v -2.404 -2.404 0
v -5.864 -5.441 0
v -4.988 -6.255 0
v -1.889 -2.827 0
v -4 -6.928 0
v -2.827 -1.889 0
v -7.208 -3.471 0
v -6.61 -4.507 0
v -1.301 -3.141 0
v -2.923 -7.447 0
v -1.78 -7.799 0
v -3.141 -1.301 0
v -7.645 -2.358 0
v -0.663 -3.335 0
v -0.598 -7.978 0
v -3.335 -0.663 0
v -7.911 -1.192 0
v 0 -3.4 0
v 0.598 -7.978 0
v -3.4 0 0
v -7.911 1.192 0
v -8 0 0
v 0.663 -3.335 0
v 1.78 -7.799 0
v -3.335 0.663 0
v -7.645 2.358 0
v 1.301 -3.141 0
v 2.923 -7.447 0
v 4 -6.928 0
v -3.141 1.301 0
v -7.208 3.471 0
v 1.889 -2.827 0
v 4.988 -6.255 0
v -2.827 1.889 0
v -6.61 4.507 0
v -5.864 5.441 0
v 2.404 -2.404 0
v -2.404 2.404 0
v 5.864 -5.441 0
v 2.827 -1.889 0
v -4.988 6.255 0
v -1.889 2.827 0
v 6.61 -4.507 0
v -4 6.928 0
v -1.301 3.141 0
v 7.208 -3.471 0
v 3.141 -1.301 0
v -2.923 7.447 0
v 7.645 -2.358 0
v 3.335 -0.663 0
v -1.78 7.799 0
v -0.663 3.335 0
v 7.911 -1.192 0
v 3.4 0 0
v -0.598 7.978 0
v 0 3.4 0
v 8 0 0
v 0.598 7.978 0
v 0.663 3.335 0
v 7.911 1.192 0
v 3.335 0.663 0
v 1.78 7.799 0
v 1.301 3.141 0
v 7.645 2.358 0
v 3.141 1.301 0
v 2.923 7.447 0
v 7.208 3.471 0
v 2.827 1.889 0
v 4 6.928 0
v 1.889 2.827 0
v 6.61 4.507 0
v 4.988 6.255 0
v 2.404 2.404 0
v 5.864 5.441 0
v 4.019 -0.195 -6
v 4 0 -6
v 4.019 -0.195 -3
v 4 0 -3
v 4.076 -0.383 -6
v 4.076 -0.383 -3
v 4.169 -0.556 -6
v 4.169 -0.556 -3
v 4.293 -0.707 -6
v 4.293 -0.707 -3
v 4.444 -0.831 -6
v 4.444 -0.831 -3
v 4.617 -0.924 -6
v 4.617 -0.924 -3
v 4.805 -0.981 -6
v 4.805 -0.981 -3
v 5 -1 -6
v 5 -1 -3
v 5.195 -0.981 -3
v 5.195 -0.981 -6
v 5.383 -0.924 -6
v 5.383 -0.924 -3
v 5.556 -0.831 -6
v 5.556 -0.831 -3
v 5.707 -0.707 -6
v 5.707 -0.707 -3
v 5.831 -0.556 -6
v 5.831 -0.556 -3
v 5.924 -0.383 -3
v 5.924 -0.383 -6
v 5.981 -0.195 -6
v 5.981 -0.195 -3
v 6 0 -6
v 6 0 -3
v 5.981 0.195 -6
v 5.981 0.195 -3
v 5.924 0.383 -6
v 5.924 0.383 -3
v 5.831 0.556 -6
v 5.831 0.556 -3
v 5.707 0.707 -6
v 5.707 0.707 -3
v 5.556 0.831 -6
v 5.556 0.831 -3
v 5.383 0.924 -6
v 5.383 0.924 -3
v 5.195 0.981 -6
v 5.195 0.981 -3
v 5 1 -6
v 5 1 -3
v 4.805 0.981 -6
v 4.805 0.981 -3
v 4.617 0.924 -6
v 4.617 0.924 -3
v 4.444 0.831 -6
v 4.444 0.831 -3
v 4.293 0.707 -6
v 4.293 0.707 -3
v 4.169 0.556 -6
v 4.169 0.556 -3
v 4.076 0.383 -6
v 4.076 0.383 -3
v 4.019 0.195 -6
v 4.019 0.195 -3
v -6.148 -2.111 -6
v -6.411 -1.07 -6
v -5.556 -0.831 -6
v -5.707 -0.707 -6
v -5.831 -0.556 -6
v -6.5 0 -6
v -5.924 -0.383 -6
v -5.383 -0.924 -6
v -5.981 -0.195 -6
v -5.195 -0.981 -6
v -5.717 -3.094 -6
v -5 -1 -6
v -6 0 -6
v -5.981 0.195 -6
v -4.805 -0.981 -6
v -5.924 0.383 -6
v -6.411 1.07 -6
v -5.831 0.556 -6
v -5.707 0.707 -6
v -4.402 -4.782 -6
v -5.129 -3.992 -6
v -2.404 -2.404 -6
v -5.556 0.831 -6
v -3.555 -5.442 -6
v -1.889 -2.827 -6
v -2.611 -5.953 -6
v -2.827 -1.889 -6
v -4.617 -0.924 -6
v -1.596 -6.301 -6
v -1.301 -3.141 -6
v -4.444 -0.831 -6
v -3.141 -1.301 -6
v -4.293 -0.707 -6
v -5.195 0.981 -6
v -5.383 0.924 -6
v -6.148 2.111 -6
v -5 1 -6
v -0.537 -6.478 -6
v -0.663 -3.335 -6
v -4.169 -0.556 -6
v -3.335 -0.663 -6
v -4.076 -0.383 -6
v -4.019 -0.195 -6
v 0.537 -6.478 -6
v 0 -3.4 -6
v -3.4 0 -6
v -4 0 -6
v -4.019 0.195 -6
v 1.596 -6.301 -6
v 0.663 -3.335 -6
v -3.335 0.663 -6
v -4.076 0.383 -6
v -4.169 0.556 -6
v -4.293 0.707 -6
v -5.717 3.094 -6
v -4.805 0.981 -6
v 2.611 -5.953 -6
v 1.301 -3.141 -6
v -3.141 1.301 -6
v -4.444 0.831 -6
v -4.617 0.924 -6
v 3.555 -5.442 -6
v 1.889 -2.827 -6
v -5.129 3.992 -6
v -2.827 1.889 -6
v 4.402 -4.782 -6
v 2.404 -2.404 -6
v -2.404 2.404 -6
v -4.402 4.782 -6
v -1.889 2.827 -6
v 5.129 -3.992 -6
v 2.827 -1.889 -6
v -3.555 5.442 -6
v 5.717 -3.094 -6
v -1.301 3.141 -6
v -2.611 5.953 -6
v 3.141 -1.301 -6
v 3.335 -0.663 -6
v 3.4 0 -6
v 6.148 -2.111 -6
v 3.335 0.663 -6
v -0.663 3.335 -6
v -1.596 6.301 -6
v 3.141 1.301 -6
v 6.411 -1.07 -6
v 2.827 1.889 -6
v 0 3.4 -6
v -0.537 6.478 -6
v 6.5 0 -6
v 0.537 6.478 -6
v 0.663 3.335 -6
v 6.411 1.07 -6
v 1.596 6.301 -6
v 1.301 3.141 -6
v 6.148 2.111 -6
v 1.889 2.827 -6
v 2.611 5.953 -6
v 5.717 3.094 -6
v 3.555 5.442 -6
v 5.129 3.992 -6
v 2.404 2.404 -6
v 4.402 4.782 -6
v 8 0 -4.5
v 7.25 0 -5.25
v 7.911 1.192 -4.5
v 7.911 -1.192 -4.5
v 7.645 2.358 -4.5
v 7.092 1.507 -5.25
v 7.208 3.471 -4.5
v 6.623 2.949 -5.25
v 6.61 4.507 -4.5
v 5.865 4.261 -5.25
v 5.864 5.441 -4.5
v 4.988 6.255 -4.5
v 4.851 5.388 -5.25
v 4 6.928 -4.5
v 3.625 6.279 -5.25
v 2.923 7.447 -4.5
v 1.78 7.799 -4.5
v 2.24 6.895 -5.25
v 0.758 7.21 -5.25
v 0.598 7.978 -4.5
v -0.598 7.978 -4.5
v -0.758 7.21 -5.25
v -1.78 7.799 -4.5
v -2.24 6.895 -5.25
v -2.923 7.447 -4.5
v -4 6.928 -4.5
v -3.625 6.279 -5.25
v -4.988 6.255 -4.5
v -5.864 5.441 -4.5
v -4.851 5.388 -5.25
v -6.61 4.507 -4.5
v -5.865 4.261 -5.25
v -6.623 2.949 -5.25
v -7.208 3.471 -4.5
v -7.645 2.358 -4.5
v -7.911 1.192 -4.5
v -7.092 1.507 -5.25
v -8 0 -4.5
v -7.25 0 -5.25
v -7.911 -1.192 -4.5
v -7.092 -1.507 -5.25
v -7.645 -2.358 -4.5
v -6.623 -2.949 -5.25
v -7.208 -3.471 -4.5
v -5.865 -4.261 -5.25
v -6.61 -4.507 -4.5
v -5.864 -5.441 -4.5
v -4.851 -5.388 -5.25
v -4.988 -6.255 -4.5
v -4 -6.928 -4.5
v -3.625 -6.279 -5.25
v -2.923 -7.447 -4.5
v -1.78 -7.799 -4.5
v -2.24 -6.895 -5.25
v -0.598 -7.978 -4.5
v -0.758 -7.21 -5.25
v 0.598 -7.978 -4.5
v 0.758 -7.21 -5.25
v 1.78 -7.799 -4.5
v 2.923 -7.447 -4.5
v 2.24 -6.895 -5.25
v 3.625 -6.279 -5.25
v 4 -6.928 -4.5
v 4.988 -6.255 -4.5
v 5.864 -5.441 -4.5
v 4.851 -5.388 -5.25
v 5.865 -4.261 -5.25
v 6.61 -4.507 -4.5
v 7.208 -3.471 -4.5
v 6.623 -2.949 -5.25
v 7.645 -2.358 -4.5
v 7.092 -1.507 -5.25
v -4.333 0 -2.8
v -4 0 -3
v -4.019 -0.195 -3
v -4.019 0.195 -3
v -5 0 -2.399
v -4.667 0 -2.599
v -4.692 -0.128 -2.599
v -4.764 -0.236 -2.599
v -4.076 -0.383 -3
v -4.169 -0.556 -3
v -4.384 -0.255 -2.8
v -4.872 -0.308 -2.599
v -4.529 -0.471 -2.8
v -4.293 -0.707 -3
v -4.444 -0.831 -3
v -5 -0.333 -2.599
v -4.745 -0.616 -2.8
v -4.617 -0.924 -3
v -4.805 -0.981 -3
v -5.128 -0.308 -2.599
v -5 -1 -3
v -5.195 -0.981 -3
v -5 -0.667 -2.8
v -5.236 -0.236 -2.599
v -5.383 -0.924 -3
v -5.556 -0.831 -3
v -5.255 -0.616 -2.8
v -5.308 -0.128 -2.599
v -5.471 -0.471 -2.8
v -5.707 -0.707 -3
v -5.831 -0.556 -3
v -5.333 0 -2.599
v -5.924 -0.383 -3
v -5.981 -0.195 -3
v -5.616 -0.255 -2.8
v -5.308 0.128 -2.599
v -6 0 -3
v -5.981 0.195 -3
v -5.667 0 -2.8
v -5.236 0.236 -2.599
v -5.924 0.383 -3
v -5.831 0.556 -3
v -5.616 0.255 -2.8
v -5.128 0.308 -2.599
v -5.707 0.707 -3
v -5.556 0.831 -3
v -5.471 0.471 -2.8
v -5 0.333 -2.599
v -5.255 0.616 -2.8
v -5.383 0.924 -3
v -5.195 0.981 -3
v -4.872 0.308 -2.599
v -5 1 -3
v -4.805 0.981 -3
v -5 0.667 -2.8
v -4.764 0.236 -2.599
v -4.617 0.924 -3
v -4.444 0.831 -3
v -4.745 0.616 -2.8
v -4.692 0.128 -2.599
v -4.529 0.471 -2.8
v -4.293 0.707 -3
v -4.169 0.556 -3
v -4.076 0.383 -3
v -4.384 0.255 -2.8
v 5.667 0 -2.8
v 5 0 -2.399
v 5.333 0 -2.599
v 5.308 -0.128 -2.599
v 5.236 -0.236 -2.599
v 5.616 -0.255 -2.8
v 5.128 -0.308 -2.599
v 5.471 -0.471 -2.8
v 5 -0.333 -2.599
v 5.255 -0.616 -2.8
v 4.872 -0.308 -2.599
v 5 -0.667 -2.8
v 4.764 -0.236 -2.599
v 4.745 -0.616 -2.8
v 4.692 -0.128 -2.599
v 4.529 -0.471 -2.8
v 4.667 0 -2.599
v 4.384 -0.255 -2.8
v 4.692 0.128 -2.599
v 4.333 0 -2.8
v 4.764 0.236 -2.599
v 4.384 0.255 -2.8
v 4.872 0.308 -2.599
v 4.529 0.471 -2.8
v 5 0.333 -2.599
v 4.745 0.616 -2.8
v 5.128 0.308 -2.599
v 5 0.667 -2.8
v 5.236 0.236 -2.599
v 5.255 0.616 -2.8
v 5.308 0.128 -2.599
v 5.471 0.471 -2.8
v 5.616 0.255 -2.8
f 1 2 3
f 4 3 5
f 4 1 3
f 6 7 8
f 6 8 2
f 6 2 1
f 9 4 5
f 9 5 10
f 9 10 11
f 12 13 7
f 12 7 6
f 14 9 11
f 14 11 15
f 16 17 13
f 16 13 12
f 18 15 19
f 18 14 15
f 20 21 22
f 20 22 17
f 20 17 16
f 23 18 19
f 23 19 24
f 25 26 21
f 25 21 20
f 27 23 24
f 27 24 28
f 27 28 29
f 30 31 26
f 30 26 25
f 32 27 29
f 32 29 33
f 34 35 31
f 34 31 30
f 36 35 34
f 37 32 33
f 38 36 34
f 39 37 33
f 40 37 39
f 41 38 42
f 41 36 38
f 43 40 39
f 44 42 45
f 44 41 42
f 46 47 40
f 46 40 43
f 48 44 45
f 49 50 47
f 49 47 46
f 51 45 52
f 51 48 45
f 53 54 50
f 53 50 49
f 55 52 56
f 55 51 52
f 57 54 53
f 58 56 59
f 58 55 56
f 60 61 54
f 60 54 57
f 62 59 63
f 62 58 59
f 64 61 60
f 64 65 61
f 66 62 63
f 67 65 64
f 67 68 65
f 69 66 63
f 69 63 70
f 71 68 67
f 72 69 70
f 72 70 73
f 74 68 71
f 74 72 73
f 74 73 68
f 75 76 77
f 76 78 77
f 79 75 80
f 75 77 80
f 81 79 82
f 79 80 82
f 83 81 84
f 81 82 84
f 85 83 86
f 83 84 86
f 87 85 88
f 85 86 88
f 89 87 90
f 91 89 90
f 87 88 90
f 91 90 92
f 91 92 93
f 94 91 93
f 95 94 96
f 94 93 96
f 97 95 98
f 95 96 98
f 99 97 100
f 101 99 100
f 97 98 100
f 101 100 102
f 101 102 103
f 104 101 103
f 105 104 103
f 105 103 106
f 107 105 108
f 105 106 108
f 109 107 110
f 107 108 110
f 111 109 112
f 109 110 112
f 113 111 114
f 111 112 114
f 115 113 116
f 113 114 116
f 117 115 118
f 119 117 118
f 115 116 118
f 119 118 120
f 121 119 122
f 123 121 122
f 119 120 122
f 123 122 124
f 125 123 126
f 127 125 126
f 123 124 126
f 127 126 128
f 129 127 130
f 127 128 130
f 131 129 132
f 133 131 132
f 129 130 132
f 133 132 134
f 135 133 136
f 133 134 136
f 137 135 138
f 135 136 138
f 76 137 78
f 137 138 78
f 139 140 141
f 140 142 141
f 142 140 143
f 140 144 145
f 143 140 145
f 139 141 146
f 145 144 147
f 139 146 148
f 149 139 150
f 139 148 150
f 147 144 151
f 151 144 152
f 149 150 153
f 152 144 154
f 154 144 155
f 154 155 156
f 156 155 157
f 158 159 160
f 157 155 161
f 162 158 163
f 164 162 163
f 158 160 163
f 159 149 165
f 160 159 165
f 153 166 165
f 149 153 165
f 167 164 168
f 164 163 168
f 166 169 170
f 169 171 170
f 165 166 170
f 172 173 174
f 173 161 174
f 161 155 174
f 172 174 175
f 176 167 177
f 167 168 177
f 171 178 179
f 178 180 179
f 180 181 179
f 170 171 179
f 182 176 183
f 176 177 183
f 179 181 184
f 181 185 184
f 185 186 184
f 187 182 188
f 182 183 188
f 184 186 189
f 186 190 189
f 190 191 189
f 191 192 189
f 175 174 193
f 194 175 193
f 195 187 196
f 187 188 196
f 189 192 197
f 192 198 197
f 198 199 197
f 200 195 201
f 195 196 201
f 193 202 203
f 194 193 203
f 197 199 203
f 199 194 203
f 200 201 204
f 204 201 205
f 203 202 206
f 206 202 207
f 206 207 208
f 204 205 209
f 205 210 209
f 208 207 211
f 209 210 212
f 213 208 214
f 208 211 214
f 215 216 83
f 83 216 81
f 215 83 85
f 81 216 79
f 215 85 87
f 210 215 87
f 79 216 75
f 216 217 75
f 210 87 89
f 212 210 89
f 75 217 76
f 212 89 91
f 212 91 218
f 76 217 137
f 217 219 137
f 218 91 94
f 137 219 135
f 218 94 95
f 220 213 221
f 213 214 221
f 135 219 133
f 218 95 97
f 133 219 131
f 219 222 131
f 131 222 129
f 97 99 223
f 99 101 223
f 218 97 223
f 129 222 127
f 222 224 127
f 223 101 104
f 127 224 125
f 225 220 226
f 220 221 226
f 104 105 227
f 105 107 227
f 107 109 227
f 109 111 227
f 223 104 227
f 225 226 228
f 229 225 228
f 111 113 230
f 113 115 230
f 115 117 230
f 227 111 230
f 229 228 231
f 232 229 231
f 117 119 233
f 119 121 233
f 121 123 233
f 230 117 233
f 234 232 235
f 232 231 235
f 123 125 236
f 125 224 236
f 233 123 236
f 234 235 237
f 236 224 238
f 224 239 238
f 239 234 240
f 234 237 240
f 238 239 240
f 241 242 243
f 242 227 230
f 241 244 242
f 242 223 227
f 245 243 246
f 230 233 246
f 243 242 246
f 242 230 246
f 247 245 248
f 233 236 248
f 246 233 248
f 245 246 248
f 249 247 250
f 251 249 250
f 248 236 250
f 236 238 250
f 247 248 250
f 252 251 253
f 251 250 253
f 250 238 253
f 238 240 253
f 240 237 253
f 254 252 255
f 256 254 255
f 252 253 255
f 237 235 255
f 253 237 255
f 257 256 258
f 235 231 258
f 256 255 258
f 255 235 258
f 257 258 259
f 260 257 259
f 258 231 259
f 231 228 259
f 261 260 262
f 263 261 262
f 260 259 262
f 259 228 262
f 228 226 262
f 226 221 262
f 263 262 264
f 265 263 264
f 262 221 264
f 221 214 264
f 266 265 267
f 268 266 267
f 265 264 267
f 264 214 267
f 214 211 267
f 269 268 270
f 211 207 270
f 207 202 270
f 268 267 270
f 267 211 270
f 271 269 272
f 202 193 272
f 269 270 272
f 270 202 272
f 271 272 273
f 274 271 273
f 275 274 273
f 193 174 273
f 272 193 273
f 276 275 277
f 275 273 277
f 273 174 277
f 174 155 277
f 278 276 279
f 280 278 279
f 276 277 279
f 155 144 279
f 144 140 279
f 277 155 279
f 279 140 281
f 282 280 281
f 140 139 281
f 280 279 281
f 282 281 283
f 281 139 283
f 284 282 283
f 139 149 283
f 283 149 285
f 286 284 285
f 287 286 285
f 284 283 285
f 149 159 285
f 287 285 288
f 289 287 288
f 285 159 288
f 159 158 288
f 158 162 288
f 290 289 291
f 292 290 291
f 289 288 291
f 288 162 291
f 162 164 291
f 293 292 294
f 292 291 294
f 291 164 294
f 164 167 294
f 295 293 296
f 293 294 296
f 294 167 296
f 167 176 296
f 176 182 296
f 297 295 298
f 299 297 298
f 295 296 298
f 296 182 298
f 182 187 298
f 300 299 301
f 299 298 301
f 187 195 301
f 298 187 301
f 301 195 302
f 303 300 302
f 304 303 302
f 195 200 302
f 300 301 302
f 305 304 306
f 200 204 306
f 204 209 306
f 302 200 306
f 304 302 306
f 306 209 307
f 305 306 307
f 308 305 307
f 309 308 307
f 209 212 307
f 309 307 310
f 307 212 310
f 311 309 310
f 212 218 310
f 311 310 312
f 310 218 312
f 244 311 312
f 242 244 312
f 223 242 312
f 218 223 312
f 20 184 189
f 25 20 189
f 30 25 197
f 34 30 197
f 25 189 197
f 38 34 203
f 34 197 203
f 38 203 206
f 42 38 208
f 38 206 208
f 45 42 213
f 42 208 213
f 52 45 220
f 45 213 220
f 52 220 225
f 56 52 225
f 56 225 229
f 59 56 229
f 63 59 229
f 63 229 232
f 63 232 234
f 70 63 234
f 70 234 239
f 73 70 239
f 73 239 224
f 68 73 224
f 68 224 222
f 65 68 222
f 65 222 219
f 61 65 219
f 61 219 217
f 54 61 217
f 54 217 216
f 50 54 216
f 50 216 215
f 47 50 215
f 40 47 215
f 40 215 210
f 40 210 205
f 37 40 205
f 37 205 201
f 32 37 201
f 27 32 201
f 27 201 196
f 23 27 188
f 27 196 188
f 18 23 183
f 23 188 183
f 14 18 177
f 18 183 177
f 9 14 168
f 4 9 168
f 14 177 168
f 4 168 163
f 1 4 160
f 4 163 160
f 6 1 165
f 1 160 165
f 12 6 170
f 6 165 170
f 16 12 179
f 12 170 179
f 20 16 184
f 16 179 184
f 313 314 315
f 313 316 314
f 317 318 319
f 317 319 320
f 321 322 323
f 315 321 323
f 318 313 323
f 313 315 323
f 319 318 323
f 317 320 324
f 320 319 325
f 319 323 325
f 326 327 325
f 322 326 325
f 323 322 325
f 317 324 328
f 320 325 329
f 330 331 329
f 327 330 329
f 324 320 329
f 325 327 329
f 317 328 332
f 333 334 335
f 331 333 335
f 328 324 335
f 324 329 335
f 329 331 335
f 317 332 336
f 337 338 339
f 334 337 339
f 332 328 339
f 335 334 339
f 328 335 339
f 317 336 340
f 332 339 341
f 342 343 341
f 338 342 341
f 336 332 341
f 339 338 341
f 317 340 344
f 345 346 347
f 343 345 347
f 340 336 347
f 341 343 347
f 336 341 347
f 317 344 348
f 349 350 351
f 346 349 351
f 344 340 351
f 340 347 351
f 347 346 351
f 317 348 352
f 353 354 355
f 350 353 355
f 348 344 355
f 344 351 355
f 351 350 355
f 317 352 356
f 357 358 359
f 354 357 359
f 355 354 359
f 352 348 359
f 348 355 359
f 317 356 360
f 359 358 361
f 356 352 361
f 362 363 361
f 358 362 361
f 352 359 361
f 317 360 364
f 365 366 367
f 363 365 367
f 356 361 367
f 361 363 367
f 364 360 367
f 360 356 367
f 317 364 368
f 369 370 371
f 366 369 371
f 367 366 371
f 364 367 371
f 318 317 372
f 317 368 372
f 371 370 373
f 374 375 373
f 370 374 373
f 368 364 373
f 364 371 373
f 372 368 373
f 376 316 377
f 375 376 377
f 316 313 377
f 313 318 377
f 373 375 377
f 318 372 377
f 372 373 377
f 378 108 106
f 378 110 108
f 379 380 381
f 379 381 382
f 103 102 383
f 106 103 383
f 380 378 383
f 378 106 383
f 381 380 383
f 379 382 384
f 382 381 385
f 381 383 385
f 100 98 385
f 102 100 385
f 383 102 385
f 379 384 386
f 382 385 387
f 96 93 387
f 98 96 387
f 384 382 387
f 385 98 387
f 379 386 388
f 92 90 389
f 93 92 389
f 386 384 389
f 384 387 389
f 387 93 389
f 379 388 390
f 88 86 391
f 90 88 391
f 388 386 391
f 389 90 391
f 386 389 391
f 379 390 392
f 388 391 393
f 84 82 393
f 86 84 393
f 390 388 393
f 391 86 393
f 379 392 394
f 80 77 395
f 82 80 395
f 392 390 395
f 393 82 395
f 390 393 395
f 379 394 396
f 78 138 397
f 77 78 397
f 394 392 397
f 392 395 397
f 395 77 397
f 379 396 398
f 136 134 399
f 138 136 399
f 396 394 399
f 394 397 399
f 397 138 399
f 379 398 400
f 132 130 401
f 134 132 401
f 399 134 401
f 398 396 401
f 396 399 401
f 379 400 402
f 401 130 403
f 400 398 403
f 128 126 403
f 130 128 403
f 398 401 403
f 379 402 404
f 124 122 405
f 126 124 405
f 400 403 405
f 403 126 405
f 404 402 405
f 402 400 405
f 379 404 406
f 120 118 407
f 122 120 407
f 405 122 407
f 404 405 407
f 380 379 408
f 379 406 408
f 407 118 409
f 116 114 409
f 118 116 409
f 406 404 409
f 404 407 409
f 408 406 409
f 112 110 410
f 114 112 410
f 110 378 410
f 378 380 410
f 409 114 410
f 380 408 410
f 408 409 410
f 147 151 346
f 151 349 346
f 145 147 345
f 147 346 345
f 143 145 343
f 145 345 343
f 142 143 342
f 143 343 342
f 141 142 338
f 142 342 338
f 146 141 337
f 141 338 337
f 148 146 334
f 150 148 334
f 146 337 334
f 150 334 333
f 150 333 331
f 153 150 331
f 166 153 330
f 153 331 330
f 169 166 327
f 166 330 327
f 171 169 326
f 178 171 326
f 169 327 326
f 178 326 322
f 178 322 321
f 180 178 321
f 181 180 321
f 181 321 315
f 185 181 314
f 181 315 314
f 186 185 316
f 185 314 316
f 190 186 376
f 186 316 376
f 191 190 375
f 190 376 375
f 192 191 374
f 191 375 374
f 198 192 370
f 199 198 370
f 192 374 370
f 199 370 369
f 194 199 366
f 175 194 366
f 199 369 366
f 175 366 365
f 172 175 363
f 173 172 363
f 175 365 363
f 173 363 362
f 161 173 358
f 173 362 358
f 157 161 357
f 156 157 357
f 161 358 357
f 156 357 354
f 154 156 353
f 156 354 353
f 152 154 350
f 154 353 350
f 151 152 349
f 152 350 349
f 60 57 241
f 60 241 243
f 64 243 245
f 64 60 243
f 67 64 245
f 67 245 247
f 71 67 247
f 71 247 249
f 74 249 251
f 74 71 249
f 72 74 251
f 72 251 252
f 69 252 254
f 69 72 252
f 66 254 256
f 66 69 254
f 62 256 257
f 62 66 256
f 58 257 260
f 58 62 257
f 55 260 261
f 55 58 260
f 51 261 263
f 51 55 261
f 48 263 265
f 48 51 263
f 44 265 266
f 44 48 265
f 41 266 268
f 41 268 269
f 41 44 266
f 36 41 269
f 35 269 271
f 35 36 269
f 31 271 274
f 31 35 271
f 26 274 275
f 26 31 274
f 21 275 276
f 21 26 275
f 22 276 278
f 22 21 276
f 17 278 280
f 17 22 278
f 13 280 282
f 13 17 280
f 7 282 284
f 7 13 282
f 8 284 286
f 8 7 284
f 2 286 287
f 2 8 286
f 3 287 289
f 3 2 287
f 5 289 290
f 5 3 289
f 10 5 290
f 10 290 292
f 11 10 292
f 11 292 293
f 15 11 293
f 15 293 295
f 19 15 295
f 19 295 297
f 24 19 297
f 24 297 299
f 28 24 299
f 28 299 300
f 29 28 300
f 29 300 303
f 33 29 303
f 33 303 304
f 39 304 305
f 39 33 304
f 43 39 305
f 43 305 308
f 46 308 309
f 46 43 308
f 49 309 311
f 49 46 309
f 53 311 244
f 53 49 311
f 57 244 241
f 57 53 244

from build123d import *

# Parameters (mm, degrees)
F0_R     = 8
F2_DEPTH = 6
F3_D     = 6.8
F3_DEPTH = 13.8976
F3_TIP   = 2.0429261047
F4_SIZE  = 1.5
F6_D     = 2
F6_DEPTH = 3
F6_TIP   = 0.600860619


with BuildPart() as f2:
    # F0 (on Top) → F2 (new body)
    with BuildSketch(Plane.XY):
        Circle(F0_R)
    extrude(amount=-F2_DEPTH)

    # F3
    with Locations(Plane.XY):
        with Locations((0, 0)):
            Hole(F3_D / 2, depth=F3_DEPTH)
            with Locations((0, 0, -(F3_DEPTH + F3_TIP / 2))):  # 118° drill point
                Cone(0, F3_D / 2, F3_TIP, mode=Mode.SUBTRACT)

    # F4
    f4_edges = [f2.edges().sort_by_distance(p)[0] for p in [
        (-8, 0, -6),
    ]]
    chamfer(f4_edges, length=F4_SIZE)

    # F6
    with Locations(Plane(origin=(0, 0, -6), x_dir=(1, 0, 0), z_dir=(0, 0, -1))):
        with Locations((-5, 0), (5, 0)):
            Hole(F6_D / 2, depth=F6_DEPTH)
            with Locations((0, 0, -(F6_DEPTH + F6_TIP / 2))):  # 118° drill point
                Cone(0, F6_D / 2, F6_TIP, mode=Mode.SUBTRACT)


solid = f2.part
